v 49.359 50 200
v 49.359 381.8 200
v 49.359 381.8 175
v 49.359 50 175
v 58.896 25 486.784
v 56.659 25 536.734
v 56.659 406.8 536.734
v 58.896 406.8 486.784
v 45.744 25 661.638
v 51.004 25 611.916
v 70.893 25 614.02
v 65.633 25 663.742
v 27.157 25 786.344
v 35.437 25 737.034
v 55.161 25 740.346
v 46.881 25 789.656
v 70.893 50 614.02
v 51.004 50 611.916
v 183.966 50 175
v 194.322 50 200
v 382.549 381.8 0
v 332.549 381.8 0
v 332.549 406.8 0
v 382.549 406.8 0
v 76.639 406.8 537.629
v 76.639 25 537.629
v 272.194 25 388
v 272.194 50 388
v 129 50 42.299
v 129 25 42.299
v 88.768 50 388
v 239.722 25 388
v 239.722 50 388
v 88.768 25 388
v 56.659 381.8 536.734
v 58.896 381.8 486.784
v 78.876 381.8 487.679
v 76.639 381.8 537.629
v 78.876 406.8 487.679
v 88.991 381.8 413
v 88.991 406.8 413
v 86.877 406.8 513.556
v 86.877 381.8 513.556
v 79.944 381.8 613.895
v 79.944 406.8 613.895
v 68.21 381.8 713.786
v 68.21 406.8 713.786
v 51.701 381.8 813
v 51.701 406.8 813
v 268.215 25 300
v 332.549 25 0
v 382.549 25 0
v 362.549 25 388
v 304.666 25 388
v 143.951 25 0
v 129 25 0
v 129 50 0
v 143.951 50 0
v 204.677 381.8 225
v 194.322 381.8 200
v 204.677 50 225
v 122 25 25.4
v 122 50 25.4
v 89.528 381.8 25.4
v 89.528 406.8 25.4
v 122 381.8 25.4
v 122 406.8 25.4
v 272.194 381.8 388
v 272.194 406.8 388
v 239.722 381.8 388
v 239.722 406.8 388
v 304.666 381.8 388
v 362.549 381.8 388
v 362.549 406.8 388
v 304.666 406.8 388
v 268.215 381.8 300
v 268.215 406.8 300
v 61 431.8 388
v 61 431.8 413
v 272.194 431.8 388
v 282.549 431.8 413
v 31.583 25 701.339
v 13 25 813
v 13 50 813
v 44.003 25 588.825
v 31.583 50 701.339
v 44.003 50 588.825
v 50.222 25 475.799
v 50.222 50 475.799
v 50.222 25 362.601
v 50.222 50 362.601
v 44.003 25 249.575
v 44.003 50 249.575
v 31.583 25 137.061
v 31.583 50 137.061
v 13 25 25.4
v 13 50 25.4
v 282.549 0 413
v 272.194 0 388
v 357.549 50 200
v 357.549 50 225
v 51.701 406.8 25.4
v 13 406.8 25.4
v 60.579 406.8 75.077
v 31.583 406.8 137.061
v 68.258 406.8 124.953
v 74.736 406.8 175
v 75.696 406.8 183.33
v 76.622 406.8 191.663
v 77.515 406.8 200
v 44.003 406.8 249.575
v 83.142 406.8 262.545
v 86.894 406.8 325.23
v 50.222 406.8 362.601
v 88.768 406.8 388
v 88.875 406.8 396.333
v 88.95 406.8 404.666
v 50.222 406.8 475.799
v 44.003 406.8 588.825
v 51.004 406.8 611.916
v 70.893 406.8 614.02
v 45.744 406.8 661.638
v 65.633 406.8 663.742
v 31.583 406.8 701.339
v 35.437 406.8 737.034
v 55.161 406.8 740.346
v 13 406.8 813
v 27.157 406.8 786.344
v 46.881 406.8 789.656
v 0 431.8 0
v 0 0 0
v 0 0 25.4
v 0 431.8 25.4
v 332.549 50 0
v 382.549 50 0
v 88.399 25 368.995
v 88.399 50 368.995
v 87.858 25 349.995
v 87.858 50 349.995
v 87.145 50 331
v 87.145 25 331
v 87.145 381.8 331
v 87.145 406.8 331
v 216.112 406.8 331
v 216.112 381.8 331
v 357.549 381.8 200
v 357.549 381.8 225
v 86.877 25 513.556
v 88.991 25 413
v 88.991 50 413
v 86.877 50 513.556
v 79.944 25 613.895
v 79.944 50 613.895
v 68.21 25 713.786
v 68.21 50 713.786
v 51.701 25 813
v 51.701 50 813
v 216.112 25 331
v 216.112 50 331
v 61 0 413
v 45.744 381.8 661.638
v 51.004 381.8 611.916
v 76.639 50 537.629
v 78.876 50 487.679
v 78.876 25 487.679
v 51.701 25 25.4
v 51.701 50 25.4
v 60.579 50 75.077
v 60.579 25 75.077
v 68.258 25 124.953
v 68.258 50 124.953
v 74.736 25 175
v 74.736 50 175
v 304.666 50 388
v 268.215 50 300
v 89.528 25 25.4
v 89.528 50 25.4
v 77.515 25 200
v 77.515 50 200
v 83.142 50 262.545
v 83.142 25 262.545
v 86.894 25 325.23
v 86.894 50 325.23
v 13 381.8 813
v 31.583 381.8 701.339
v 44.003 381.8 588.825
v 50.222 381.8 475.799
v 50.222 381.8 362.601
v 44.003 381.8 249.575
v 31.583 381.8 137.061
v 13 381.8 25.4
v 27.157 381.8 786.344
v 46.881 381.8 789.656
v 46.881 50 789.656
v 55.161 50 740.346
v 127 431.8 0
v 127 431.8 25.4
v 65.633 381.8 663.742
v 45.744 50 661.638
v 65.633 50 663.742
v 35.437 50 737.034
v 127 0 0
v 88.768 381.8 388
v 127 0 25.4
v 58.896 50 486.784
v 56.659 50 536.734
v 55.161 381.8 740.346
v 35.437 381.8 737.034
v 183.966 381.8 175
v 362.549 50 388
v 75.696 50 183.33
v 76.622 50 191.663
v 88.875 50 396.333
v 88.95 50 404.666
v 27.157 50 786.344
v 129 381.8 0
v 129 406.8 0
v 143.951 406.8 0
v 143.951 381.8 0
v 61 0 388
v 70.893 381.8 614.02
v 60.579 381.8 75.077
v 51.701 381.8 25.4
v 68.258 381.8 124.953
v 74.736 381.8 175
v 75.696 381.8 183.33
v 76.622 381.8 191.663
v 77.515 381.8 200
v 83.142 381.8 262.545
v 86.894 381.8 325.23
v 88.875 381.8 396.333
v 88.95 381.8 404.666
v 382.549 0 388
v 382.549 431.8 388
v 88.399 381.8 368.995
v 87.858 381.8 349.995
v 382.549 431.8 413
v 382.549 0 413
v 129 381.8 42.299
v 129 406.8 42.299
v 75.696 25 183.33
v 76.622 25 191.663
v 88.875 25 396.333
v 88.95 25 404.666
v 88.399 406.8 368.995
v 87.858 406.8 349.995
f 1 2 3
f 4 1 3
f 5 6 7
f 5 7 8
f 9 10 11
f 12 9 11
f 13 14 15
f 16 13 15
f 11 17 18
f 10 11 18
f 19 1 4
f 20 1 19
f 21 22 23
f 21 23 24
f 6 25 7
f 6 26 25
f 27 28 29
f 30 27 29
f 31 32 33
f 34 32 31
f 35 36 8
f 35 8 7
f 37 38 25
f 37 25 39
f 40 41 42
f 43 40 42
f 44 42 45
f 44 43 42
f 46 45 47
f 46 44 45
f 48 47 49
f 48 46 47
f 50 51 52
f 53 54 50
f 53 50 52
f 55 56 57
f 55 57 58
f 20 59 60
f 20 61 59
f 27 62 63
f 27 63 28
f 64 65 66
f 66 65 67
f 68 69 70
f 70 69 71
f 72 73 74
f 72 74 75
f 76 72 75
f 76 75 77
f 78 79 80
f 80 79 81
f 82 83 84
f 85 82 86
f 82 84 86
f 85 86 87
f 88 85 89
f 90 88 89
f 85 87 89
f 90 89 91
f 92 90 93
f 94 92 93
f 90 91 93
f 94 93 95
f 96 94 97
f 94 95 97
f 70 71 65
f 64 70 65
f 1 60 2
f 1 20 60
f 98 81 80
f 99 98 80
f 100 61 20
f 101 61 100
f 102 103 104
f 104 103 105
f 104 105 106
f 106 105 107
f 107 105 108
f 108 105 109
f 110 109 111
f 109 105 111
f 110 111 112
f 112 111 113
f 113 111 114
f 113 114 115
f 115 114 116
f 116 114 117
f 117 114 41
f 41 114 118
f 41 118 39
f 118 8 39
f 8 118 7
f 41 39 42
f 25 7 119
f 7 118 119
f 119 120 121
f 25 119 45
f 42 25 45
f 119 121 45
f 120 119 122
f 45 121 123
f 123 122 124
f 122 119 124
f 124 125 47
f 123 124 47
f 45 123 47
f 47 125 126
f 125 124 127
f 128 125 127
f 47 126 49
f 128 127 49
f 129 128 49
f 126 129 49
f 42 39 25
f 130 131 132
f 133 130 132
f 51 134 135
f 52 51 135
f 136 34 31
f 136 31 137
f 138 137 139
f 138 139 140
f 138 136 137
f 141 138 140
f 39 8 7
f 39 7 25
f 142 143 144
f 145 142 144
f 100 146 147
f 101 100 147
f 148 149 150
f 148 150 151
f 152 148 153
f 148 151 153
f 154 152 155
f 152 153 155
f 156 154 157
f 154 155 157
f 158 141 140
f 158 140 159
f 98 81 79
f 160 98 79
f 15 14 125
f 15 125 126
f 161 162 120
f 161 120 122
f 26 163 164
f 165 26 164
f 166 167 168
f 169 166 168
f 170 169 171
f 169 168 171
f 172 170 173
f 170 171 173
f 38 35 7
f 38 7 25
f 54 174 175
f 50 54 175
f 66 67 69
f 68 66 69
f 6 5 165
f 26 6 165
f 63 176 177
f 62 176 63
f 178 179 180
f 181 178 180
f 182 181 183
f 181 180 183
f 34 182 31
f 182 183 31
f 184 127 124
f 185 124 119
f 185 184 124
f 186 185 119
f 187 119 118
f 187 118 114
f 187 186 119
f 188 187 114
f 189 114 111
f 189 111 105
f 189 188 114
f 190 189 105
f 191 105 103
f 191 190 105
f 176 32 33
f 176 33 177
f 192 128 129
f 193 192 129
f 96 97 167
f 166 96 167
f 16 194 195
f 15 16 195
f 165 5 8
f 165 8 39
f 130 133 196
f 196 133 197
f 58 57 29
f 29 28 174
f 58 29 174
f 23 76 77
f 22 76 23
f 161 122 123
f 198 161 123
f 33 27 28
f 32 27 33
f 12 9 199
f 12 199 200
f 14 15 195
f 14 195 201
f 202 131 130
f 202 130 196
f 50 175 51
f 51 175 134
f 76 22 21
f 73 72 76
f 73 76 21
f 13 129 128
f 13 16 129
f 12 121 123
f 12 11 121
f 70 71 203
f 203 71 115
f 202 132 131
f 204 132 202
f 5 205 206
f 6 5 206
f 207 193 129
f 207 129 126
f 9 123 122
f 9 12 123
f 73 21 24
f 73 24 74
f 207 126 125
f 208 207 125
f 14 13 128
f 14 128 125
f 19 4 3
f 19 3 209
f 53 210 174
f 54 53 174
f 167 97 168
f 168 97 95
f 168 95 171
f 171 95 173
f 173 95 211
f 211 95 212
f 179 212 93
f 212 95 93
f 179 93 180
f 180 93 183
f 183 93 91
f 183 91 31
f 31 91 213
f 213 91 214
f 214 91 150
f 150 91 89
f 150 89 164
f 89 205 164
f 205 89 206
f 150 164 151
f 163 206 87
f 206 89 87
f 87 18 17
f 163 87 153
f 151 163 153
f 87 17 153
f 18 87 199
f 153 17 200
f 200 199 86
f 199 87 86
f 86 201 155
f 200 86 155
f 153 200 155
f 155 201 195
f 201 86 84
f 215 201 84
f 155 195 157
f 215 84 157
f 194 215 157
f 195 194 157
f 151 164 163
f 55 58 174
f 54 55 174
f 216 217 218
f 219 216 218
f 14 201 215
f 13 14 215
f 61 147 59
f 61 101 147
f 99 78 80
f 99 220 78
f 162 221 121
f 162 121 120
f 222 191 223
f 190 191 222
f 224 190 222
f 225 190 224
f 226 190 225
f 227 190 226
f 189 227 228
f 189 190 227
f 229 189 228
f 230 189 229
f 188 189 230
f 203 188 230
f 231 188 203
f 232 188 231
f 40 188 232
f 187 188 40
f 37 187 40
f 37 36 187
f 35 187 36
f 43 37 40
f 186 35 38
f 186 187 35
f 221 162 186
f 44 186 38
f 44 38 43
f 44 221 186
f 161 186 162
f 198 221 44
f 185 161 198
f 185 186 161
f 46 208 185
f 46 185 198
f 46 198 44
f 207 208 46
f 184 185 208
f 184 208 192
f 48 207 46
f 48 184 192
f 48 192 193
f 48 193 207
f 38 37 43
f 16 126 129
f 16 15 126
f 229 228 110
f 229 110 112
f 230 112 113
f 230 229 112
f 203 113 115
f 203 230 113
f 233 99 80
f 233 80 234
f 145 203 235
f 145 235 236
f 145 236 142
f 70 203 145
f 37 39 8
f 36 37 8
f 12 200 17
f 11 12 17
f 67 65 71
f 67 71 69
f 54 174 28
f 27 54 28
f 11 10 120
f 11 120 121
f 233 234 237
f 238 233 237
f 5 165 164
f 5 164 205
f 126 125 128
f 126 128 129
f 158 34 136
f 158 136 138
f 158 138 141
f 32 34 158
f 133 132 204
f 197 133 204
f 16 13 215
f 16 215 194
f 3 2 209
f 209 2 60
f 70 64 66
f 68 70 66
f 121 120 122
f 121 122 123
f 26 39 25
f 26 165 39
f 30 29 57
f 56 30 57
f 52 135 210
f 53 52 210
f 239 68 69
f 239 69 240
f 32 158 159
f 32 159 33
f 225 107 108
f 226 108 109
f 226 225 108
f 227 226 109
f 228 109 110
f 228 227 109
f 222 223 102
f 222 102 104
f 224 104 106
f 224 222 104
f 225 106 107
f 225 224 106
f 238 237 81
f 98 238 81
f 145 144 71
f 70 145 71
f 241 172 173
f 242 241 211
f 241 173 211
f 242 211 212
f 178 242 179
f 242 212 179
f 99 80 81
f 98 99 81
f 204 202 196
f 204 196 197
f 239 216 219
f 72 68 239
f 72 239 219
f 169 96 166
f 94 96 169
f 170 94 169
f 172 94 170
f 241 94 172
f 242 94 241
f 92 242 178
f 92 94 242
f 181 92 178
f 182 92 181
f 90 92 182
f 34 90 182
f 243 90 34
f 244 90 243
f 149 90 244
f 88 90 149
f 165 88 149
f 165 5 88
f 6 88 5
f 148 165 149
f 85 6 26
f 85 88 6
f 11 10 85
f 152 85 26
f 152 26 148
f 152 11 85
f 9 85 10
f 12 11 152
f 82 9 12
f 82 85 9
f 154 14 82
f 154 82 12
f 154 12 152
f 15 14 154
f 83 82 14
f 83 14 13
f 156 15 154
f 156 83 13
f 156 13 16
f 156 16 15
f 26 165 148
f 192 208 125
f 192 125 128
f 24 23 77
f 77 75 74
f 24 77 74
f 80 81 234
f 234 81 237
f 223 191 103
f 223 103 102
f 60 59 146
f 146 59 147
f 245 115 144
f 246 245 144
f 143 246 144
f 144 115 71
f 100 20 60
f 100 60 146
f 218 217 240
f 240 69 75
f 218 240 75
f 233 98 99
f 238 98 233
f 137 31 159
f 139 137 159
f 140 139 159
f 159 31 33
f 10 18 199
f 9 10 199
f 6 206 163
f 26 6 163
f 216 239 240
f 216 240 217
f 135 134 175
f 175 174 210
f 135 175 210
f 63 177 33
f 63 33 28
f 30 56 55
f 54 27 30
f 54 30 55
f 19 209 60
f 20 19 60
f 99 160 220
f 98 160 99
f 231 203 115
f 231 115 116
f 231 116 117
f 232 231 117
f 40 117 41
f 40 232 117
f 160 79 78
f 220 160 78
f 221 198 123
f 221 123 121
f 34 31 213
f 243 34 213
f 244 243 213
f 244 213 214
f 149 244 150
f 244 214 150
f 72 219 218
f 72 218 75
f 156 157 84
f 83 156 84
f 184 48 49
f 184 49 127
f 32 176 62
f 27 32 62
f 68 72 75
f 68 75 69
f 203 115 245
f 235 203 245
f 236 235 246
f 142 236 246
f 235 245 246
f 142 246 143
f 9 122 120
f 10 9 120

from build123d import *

# Parameters (mm, degrees)
F0_W           = 127
F0_H           = 25.4
F1_DEPTH       = 431.8
F7_START       = 165.9
F7_DEPTH       = 25
F8_DEPTH       = 215.9
F8_DEPTH_BACK  = 215.9
F10_DEPTH      = 25
F12_DEPTH      = 25
F14_DEPTH      = 165.9
F14_DEPTH_BACK = 165.9
F15_DEPTH      = 190.9
F15_DEPTH_BACK = 190.9
F16_DEPTH      = 215.9
F16_DEPTH_BACK = 215.9
F17_DEPTH      = 165.9
F17_DEPTH_BACK = 165.9
F19_START      = 165.9
F19_DEPTH      = 25
F22_START      = 165.9
F22_DEPTH      = 25


with BuildPart() as f1:
    # F0 (on Front) → F1 (new body)
    with BuildSketch(Plane.XZ):
        with Locations((63.5, 12.7)):
            Rectangle(F0_W, F0_H)
    extrude(amount=-F1_DEPTH)


with BuildPart() as f7:
    # F6 (on plane+point) → F7 (new body)
    with BuildSketch(Plane.XZ.offset(-215.9).offset(F7_START)):
        with BuildLine():
            Line((49.358533718, 175), (49.358533718, 200))
            Line((49.358533718, 200), (77.5147993211, 200))
            ThreePointArc((77.5147993211, 200), (85.2525152456, 293.873632884), (88.7679401276, 388))
            Line((88.7679401276, 388), (61, 388))
            Line((61, 388), (61, 413))
            Line((61, 413), (88.9908367156, 413))
            ThreePointArc((88.9908367156, 413), (79.9444647253, 613.8948191706), (51.7010197752, 813))
            Line((51.7010197752, 813), (13, 813))
            ThreePointArc((13, 813), (51, 419.2), (13, 25.4))
            Line((13, 25.4), (51.7010197752, 25.4))
            ThreePointArc((51.7010197752, 25.4), (64.5684693976, 99.99214596), (74.7361304376, 175))
            Line((74.7361304376, 175), (49.358533718, 175))
        make_face()
        Polygon((58.8963284271, 486.7843108688), (56.6588197025, 536.7342213262), (76.6387838854, 537.6292248161), (78.8762926101, 487.6793143587), align=None, mode=Mode.SUBTRACT)
        Polygon((51.0038156462, 611.9157040706), (45.7441538721, 661.6382940878), (65.633189879, 663.7421587975), (70.8928516531, 614.0195687802), align=None, mode=Mode.SUBTRACT)
        Polygon((35.4365940724, 737.034373409), (27.1573289044, 786.3441469664), (46.8812383273, 789.6558530336), (55.1605034953, 740.3460794762), align=None, mode=Mode.SUBTRACT)
        with BuildLine():
            Line((61, 388), (88.7679401276, 388))
            ThreePointArc((88.7679401276, 388), (88.9166368522, 400.4996678981), (88.9908367156, 413))
            Line((88.9908367156, 413), (61, 413))
            Line((61, 413), (61, 388))
        make_face()
        with BuildLine():
            Line((77.5147993211, 200), (49.358533718, 200))
            Line((49.358533718, 200), (49.358533718, 175))
            Line((49.358533718, 175), (74.7361304376, 175))
            ThreePointArc((74.7361304376, 175), (76.1629411944, 187.4958346292), (77.5147993211, 200))
        make_face()
    extrude(amount=F7_DEPTH)


with BuildPart() as f8:
    # F6 (on plane+point) → F8 (new body, two sides)
    with BuildSketch(Plane.XZ.offset(-215.9)) as f8_sk:
        with BuildLine():
            ThreePointArc((88.9908367156, 413), (88.9166368522, 400.4996678981), (88.7679401276, 388))
            Line((88.7679401276, 388), (272.1938377165, 388))
            Line((272.1938377165, 388), (282.5491767758, 413))
            Line((282.5491767758, 413), (88.9908367156, 413))
        make_face()
        with BuildLine():
            Line((61, 388), (88.7679401276, 388))
            ThreePointArc((88.7679401276, 388), (88.9166368522, 400.4996678981), (88.9908367156, 413))
            Line((88.9908367156, 413), (61, 413))
            Line((61, 413), (61, 388))
        make_face()
    extrude(amount=F8_DEPTH)
    extrude(f8_sk.sketch, amount=-F8_DEPTH_BACK)


with BuildPart() as f10:
    # F9 (on offset) → F10 (new body)
    with BuildSketch(Plane.XZ.offset(-25)):
        Polygon((122, 25.4), (272.1938377165, 388), (239.7220717077, 388), (89.5282339912, 25.4), align=None)
    extrude(amount=-F10_DEPTH)


with BuildPart() as f12:
    # F11 (on offset) → F12 (new body)
    with BuildSketch(Plane.XZ.offset(-25)):
        with BuildLine():
            ThreePointArc((88.7679401276, 388), (88.1500688424, 359.4944838008), (87.1447770272, 331))
            Line((87.1447770272, 331), (216.1118986524, 331))
            Line((216.1118986524, 331), (239.7220717077, 388))
            Line((239.7220717077, 388), (88.7679401276, 388))
        make_face()
    extrude(amount=-F12_DEPTH)


with BuildPart() as f13_1:
    # F13: instance of F12
    add(f12.part.mirror(Plane.XZ.offset(-215.9)))


with BuildPart() as f13_2:
    # F13: instance of F10
    add(f10.part.mirror(Plane.XZ.offset(-215.9)))


with BuildPart() as f13_3:
    # F13: instance of F7
    add(f7.part.mirror(Plane.XZ.offset(-215.9)))


with BuildPart() as f14:
    # F6 (on plane+point) → F14 (new body, two sides)
    with BuildSketch(Plane.XZ.offset(-215.9)) as f14_sk:
        with BuildLine():
            Line((194.3216879903, 200), (77.5147993211, 200))
            ThreePointArc((77.5147993211, 200), (76.1629411944, 187.4958346292), (74.7361304376, 175))
            Line((74.7361304376, 175), (183.966348931, 175))
            Line((183.966348931, 175), (194.3216879903, 200))
        make_face()
        with BuildLine():
            Line((77.5147993211, 200), (49.358533718, 200))
            Line((49.358533718, 200), (49.358533718, 175))
            Line((49.358533718, 175), (74.7361304376, 175))
            ThreePointArc((74.7361304376, 175), (76.1629411944, 187.4958346292), (77.5147993211, 200))
        make_face()
    extrude(amount=F14_DEPTH)
    extrude(f14_sk.sketch, amount=-F14_DEPTH_BACK)


with BuildPart() as f15:
    # F6 (on plane+point) → F15 (new body, two sides)
    with BuildSketch(Plane.XZ.offset(-215.9)) as f15_sk:
        Polygon((46.8812383273, 789.6558530336), (27.1573289044, 786.3441469664), (35.4365940724, 737.034373409), (55.1605034953, 740.3460794762), align=None)
    extrude(amount=F15_DEPTH)
    extrude(f15_sk.sketch, amount=-F15_DEPTH_BACK)


with BuildPart() as f15b:
    # F6 (on plane+point) → F15, piece 2 (new body, two sides)
    with BuildSketch(Plane.XZ.offset(-215.9)) as f15_2_sk:
        Polygon((65.633189879, 663.7421587975), (45.7441538721, 661.6382940878), (51.0038156462, 611.9157040706), (70.8928516531, 614.0195687802), align=None)
    extrude(amount=F15_DEPTH)
    extrude(f15_2_sk.sketch, amount=-F15_DEPTH_BACK)


with BuildPart() as f15c:
    # F6 (on plane+point) → F15, piece 3 (new body, two sides)
    with BuildSketch(Plane.XZ.offset(-215.9)) as f15_3_sk:
        Polygon((76.6387838854, 537.6292248161), (56.6588197025, 536.7342213262), (58.8963284271, 486.7843108688), (78.8762926101, 487.6793143587), align=None)
    extrude(amount=F15_DEPTH)
    extrude(f15_3_sk.sketch, amount=-F15_DEPTH_BACK)


with BuildPart() as f16:
    # F6 (on plane+point) → F16 (new body, two sides)
    with BuildSketch(Plane.XZ.offset(-215.9)) as f16_sk:
        Polygon((282.5491767758, 413), (272.1938377165, 388), (382.5491767758, 388), (382.5491767758, 413), align=None)
    extrude(amount=F16_DEPTH)
    extrude(f16_sk.sketch, amount=-F16_DEPTH_BACK)


with BuildPart() as f17:
    # F6 (on plane+point) → F17 (new body, two sides)
    with BuildSketch(Plane.XZ.offset(-215.9)) as f17_sk:
        Polygon((204.6770270497, 225), (194.3216879903, 200), (357.5491767758, 200), (357.5491767758, 225), align=None)
    extrude(amount=F17_DEPTH)
    extrude(f17_sk.sketch, amount=-F17_DEPTH_BACK)


with BuildPart() as f19:
    # F18 (on plane+point) → F19 (new body)
    with BuildSketch(Plane.XZ.offset(-215.9).offset(F19_START)):
        Polygon((272.1938377165, 388), (129, 42.2994949366), (129, 0), (143.9507415245, 0), (304.6656037253, 388), align=None)
    extrude(amount=F19_DEPTH)


with BuildPart() as f20_1:
    # F20: instance of F19
    add(f19.part.mirror(Plane.XZ.offset(-215.9)))


with BuildPart() as f22:
    # F21 (on plane+point) → F22 (new body)
    with BuildSketch(Plane.XZ.offset(-215.9).offset(F22_START)):
        Polygon((382.5491767758, 0), (362.5491767758, 388), (304.6656037253, 388), (268.2148102364, 300), (332.5491767758, 0), align=None)
    extrude(amount=F22_DEPTH)


with BuildPart() as f23_1:
    # F23: instance of F22
    add(f22.part.mirror(Plane.XZ.offset(-215.9)))


solid = Compound([f1.part, f7.part, f8.part, f10.part, f12.part, f13_1.part, f13_2.part, f13_3.part, f14.part, f15.part, f15b.part, f15c.part, f16.part, f17.part, f19.part, f20_1.part, f22.part, f23_1.part])
